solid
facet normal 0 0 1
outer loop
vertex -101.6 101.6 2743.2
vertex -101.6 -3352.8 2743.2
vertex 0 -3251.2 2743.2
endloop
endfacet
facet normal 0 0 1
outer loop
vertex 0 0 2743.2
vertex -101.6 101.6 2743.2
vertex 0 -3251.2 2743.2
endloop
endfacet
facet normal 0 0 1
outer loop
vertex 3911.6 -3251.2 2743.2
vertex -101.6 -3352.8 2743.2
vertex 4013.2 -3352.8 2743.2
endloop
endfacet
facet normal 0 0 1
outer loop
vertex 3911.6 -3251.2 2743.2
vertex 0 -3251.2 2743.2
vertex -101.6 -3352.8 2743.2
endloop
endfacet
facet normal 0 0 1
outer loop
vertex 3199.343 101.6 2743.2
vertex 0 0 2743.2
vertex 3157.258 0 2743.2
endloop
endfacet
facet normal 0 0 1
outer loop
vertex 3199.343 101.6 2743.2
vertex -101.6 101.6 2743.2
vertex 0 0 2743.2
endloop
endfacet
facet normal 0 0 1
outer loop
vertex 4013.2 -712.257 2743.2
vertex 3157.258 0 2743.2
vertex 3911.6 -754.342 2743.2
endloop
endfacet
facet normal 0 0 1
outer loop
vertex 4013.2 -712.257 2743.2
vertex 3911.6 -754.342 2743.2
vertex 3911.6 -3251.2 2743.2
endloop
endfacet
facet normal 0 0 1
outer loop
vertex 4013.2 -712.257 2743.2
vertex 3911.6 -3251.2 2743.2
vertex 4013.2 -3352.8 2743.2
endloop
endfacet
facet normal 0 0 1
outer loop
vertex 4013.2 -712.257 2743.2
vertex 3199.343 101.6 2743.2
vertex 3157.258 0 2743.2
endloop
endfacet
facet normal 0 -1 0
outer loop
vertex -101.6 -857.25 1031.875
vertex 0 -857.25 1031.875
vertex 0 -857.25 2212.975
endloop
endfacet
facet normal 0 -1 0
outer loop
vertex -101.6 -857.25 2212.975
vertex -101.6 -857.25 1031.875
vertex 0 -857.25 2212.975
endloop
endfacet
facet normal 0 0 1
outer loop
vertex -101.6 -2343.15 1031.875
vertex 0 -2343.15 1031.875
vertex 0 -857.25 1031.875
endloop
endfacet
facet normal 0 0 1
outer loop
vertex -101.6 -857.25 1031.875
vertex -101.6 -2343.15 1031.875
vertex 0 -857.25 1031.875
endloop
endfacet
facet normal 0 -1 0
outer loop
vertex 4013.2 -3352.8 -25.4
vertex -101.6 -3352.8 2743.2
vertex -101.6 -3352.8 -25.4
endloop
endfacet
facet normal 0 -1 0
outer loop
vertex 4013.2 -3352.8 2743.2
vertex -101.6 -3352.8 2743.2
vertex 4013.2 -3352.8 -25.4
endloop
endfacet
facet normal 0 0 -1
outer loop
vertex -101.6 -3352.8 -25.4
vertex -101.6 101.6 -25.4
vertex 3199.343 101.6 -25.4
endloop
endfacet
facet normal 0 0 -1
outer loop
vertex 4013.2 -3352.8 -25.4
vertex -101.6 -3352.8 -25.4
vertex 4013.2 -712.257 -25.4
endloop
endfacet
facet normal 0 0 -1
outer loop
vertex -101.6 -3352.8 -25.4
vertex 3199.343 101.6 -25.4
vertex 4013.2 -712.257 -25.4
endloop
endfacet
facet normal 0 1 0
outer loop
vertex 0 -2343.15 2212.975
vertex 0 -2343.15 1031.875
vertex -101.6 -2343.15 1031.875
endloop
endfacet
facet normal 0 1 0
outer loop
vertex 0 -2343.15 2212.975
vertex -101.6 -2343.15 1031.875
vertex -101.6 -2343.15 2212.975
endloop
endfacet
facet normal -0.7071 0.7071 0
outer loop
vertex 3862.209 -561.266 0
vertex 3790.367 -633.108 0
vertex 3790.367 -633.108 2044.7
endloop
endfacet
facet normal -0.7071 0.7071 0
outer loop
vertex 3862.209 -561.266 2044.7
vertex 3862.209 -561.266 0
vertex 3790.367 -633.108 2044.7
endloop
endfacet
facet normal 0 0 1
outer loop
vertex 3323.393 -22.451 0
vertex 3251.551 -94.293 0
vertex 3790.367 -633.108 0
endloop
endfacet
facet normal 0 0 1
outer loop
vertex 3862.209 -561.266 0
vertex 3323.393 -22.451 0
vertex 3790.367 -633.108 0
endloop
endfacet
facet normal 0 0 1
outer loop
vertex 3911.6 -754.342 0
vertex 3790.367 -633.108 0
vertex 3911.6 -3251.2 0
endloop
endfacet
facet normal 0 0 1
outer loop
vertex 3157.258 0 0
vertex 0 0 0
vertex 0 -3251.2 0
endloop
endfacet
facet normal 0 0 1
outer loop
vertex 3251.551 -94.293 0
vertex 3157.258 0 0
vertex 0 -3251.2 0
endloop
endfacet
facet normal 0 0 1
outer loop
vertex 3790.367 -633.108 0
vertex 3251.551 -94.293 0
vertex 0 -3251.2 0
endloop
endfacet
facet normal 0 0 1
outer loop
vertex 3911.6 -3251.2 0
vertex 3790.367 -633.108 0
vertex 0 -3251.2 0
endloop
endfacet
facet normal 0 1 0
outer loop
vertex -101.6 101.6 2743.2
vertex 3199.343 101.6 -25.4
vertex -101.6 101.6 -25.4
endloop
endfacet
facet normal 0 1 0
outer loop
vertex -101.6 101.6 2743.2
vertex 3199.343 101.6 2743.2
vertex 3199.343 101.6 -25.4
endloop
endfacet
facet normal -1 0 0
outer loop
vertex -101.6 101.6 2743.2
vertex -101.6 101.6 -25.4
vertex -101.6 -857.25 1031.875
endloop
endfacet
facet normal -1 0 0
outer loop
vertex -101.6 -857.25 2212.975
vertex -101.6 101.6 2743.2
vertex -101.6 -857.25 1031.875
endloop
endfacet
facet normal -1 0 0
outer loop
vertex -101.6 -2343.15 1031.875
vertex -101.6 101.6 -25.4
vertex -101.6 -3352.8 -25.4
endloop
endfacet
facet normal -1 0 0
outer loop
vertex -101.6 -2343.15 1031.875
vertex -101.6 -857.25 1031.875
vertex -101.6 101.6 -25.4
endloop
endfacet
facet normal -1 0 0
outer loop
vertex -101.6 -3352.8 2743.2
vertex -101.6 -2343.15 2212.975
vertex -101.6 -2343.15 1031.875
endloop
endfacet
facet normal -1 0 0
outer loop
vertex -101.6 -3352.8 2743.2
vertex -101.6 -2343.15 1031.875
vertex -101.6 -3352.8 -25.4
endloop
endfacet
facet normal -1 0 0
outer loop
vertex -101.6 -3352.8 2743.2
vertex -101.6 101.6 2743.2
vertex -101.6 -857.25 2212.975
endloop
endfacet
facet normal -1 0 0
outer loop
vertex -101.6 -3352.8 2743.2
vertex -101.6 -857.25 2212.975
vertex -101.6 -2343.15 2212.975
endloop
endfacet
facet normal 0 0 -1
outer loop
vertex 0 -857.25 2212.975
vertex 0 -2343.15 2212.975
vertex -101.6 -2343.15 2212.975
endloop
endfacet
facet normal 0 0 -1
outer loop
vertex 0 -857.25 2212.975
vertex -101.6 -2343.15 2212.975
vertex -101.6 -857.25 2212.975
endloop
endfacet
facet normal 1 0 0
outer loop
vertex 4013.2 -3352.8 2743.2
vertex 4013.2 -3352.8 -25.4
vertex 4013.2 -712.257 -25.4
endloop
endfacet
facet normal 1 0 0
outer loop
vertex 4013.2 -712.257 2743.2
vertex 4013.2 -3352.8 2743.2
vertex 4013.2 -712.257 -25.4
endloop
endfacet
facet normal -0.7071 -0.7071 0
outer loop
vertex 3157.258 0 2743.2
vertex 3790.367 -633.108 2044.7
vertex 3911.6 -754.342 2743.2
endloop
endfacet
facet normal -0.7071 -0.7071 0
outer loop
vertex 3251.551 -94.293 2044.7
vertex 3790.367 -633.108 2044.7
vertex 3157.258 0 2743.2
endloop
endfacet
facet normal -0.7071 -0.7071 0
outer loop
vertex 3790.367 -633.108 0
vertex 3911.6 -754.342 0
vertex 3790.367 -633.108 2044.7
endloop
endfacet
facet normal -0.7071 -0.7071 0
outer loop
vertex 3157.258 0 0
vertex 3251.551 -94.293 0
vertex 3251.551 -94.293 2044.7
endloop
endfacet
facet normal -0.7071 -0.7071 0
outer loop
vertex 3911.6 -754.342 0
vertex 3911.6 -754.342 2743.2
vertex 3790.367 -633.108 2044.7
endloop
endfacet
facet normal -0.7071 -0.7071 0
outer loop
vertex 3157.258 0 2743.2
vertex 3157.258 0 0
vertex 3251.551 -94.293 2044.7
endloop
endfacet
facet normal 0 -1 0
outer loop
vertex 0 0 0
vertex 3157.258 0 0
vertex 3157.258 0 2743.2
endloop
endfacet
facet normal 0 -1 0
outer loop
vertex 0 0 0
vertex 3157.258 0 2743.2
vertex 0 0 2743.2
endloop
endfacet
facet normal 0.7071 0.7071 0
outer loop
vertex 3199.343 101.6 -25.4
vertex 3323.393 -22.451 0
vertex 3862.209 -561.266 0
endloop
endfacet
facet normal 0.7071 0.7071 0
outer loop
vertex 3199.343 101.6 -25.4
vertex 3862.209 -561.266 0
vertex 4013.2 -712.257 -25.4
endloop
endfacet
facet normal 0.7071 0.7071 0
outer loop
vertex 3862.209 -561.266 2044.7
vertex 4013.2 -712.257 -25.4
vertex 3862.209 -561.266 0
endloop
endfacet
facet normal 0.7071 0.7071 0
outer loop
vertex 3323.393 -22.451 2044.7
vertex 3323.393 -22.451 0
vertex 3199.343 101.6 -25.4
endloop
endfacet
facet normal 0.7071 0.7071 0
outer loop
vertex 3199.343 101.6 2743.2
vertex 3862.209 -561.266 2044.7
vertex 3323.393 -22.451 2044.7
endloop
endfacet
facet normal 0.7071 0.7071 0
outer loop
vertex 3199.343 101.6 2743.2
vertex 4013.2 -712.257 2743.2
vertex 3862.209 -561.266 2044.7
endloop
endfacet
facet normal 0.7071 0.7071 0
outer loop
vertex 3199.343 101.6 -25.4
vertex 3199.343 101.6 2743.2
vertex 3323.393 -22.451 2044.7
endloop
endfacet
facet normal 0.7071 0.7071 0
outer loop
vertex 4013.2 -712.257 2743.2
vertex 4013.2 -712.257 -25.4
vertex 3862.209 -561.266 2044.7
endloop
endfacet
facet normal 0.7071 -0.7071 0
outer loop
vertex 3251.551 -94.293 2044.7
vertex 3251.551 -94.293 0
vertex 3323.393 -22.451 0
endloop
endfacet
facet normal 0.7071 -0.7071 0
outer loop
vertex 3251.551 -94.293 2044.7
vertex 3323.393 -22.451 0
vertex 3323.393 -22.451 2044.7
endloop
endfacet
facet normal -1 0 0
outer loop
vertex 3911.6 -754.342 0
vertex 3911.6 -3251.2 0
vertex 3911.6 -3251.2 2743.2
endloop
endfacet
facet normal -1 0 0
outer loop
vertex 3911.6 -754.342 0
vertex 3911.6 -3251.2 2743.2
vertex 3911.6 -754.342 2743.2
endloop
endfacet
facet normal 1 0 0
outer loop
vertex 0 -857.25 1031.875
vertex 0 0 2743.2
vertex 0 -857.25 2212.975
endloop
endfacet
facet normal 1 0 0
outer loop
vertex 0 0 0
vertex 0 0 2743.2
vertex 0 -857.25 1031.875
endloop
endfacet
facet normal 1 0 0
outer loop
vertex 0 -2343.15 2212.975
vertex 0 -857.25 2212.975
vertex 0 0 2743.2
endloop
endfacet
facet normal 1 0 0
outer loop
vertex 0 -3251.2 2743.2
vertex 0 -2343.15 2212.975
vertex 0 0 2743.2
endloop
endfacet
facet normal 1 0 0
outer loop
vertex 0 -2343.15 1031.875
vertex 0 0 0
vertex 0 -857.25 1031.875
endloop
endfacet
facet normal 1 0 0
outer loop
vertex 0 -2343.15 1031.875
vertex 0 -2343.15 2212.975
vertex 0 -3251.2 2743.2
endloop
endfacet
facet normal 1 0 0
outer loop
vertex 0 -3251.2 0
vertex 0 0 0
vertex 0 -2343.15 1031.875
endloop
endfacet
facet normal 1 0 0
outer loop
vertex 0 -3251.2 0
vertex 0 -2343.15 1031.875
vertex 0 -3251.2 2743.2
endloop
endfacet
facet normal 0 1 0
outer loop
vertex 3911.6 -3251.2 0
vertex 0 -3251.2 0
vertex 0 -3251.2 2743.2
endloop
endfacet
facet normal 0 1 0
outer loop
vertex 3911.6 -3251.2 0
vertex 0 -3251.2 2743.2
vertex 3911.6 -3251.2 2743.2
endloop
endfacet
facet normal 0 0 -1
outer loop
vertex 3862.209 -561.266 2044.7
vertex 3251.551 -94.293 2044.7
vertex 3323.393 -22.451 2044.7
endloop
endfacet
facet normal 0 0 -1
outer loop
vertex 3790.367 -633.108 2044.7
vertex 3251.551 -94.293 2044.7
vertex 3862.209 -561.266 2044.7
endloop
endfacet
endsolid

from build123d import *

# Parameters (mm, degrees)
F1_DEPTH = 25.4
F3_DEPTH = 2743.2
F4_DEPTH = 25.4
F5_DEPTH = 2743.201
F6_W     = 1485.9
F6_H     = 1181.1
F7_DEPTH = 101.601
F8_W     = 762
F8_H     = 2044.7
F9_DEPTH = 677.085098


with BuildPart() as f1:
    # F0 (on Top) → F1 (new body)
    with BuildSketch(Plane.XY):
        Polygon((3157.258486, 0), (0, 0), (0, -3251.2), (3911.6, -3251.2), (3911.6, -754.341514), align=None)
    extrude(amount=-F1_DEPTH)

    # F2 (on Top) → F3 (join)
    with BuildSketch(Plane.XY):
        Polygon((3199.342584, 101.6), (-101.6, 101.6), (-101.6, -3352.8), (4013.2, -3352.8), (4013.2, -712.257416), align=None)
    extrude(amount=F3_DEPTH)

    # F2 (on Top) → F4 (join, through all)
    with BuildSketch(Plane.XY):
        Polygon((3199.342584, 101.6), (-101.6, 101.6), (-101.6, -3352.8), (4013.2, -3352.8), (4013.2, -712.257416), align=None)
    extrude(amount=-F4_DEPTH)

    # F0 (on Top) → F5 (cut, through all)
    with BuildSketch(Plane.XY):
        Polygon((3157.258486, 0), (0, 0), (0, -3251.2), (3911.6, -3251.2), (3911.6, -754.341514), align=None)
    extrude(amount=F5_DEPTH, mode=Mode.SUBTRACT)

    # F6 (on face) → F7 (cut, through all)
    with BuildSketch(Plane.YZ):
        with Locations((-1600.2, 1622.425)):
            Rectangle(F6_W, F6_H)
    extrude(amount=-F7_DEPTH, mode=Mode.SUBTRACT)

    # F8 (on face) → F9 (cut, through all)
    with BuildSketch(Plane(origin=(1578.629243, 1578.629243, 0), x_dir=(0.707107, -0.707107, 0), z_dir=(-0.707107, -0.707107, 0))):
        with Locations((2746.868885, 1022.35)):
            Rectangle(F8_W, F8_H)
    extrude(amount=-F9_DEPTH, mode=Mode.SUBTRACT)


solid = f1.part
